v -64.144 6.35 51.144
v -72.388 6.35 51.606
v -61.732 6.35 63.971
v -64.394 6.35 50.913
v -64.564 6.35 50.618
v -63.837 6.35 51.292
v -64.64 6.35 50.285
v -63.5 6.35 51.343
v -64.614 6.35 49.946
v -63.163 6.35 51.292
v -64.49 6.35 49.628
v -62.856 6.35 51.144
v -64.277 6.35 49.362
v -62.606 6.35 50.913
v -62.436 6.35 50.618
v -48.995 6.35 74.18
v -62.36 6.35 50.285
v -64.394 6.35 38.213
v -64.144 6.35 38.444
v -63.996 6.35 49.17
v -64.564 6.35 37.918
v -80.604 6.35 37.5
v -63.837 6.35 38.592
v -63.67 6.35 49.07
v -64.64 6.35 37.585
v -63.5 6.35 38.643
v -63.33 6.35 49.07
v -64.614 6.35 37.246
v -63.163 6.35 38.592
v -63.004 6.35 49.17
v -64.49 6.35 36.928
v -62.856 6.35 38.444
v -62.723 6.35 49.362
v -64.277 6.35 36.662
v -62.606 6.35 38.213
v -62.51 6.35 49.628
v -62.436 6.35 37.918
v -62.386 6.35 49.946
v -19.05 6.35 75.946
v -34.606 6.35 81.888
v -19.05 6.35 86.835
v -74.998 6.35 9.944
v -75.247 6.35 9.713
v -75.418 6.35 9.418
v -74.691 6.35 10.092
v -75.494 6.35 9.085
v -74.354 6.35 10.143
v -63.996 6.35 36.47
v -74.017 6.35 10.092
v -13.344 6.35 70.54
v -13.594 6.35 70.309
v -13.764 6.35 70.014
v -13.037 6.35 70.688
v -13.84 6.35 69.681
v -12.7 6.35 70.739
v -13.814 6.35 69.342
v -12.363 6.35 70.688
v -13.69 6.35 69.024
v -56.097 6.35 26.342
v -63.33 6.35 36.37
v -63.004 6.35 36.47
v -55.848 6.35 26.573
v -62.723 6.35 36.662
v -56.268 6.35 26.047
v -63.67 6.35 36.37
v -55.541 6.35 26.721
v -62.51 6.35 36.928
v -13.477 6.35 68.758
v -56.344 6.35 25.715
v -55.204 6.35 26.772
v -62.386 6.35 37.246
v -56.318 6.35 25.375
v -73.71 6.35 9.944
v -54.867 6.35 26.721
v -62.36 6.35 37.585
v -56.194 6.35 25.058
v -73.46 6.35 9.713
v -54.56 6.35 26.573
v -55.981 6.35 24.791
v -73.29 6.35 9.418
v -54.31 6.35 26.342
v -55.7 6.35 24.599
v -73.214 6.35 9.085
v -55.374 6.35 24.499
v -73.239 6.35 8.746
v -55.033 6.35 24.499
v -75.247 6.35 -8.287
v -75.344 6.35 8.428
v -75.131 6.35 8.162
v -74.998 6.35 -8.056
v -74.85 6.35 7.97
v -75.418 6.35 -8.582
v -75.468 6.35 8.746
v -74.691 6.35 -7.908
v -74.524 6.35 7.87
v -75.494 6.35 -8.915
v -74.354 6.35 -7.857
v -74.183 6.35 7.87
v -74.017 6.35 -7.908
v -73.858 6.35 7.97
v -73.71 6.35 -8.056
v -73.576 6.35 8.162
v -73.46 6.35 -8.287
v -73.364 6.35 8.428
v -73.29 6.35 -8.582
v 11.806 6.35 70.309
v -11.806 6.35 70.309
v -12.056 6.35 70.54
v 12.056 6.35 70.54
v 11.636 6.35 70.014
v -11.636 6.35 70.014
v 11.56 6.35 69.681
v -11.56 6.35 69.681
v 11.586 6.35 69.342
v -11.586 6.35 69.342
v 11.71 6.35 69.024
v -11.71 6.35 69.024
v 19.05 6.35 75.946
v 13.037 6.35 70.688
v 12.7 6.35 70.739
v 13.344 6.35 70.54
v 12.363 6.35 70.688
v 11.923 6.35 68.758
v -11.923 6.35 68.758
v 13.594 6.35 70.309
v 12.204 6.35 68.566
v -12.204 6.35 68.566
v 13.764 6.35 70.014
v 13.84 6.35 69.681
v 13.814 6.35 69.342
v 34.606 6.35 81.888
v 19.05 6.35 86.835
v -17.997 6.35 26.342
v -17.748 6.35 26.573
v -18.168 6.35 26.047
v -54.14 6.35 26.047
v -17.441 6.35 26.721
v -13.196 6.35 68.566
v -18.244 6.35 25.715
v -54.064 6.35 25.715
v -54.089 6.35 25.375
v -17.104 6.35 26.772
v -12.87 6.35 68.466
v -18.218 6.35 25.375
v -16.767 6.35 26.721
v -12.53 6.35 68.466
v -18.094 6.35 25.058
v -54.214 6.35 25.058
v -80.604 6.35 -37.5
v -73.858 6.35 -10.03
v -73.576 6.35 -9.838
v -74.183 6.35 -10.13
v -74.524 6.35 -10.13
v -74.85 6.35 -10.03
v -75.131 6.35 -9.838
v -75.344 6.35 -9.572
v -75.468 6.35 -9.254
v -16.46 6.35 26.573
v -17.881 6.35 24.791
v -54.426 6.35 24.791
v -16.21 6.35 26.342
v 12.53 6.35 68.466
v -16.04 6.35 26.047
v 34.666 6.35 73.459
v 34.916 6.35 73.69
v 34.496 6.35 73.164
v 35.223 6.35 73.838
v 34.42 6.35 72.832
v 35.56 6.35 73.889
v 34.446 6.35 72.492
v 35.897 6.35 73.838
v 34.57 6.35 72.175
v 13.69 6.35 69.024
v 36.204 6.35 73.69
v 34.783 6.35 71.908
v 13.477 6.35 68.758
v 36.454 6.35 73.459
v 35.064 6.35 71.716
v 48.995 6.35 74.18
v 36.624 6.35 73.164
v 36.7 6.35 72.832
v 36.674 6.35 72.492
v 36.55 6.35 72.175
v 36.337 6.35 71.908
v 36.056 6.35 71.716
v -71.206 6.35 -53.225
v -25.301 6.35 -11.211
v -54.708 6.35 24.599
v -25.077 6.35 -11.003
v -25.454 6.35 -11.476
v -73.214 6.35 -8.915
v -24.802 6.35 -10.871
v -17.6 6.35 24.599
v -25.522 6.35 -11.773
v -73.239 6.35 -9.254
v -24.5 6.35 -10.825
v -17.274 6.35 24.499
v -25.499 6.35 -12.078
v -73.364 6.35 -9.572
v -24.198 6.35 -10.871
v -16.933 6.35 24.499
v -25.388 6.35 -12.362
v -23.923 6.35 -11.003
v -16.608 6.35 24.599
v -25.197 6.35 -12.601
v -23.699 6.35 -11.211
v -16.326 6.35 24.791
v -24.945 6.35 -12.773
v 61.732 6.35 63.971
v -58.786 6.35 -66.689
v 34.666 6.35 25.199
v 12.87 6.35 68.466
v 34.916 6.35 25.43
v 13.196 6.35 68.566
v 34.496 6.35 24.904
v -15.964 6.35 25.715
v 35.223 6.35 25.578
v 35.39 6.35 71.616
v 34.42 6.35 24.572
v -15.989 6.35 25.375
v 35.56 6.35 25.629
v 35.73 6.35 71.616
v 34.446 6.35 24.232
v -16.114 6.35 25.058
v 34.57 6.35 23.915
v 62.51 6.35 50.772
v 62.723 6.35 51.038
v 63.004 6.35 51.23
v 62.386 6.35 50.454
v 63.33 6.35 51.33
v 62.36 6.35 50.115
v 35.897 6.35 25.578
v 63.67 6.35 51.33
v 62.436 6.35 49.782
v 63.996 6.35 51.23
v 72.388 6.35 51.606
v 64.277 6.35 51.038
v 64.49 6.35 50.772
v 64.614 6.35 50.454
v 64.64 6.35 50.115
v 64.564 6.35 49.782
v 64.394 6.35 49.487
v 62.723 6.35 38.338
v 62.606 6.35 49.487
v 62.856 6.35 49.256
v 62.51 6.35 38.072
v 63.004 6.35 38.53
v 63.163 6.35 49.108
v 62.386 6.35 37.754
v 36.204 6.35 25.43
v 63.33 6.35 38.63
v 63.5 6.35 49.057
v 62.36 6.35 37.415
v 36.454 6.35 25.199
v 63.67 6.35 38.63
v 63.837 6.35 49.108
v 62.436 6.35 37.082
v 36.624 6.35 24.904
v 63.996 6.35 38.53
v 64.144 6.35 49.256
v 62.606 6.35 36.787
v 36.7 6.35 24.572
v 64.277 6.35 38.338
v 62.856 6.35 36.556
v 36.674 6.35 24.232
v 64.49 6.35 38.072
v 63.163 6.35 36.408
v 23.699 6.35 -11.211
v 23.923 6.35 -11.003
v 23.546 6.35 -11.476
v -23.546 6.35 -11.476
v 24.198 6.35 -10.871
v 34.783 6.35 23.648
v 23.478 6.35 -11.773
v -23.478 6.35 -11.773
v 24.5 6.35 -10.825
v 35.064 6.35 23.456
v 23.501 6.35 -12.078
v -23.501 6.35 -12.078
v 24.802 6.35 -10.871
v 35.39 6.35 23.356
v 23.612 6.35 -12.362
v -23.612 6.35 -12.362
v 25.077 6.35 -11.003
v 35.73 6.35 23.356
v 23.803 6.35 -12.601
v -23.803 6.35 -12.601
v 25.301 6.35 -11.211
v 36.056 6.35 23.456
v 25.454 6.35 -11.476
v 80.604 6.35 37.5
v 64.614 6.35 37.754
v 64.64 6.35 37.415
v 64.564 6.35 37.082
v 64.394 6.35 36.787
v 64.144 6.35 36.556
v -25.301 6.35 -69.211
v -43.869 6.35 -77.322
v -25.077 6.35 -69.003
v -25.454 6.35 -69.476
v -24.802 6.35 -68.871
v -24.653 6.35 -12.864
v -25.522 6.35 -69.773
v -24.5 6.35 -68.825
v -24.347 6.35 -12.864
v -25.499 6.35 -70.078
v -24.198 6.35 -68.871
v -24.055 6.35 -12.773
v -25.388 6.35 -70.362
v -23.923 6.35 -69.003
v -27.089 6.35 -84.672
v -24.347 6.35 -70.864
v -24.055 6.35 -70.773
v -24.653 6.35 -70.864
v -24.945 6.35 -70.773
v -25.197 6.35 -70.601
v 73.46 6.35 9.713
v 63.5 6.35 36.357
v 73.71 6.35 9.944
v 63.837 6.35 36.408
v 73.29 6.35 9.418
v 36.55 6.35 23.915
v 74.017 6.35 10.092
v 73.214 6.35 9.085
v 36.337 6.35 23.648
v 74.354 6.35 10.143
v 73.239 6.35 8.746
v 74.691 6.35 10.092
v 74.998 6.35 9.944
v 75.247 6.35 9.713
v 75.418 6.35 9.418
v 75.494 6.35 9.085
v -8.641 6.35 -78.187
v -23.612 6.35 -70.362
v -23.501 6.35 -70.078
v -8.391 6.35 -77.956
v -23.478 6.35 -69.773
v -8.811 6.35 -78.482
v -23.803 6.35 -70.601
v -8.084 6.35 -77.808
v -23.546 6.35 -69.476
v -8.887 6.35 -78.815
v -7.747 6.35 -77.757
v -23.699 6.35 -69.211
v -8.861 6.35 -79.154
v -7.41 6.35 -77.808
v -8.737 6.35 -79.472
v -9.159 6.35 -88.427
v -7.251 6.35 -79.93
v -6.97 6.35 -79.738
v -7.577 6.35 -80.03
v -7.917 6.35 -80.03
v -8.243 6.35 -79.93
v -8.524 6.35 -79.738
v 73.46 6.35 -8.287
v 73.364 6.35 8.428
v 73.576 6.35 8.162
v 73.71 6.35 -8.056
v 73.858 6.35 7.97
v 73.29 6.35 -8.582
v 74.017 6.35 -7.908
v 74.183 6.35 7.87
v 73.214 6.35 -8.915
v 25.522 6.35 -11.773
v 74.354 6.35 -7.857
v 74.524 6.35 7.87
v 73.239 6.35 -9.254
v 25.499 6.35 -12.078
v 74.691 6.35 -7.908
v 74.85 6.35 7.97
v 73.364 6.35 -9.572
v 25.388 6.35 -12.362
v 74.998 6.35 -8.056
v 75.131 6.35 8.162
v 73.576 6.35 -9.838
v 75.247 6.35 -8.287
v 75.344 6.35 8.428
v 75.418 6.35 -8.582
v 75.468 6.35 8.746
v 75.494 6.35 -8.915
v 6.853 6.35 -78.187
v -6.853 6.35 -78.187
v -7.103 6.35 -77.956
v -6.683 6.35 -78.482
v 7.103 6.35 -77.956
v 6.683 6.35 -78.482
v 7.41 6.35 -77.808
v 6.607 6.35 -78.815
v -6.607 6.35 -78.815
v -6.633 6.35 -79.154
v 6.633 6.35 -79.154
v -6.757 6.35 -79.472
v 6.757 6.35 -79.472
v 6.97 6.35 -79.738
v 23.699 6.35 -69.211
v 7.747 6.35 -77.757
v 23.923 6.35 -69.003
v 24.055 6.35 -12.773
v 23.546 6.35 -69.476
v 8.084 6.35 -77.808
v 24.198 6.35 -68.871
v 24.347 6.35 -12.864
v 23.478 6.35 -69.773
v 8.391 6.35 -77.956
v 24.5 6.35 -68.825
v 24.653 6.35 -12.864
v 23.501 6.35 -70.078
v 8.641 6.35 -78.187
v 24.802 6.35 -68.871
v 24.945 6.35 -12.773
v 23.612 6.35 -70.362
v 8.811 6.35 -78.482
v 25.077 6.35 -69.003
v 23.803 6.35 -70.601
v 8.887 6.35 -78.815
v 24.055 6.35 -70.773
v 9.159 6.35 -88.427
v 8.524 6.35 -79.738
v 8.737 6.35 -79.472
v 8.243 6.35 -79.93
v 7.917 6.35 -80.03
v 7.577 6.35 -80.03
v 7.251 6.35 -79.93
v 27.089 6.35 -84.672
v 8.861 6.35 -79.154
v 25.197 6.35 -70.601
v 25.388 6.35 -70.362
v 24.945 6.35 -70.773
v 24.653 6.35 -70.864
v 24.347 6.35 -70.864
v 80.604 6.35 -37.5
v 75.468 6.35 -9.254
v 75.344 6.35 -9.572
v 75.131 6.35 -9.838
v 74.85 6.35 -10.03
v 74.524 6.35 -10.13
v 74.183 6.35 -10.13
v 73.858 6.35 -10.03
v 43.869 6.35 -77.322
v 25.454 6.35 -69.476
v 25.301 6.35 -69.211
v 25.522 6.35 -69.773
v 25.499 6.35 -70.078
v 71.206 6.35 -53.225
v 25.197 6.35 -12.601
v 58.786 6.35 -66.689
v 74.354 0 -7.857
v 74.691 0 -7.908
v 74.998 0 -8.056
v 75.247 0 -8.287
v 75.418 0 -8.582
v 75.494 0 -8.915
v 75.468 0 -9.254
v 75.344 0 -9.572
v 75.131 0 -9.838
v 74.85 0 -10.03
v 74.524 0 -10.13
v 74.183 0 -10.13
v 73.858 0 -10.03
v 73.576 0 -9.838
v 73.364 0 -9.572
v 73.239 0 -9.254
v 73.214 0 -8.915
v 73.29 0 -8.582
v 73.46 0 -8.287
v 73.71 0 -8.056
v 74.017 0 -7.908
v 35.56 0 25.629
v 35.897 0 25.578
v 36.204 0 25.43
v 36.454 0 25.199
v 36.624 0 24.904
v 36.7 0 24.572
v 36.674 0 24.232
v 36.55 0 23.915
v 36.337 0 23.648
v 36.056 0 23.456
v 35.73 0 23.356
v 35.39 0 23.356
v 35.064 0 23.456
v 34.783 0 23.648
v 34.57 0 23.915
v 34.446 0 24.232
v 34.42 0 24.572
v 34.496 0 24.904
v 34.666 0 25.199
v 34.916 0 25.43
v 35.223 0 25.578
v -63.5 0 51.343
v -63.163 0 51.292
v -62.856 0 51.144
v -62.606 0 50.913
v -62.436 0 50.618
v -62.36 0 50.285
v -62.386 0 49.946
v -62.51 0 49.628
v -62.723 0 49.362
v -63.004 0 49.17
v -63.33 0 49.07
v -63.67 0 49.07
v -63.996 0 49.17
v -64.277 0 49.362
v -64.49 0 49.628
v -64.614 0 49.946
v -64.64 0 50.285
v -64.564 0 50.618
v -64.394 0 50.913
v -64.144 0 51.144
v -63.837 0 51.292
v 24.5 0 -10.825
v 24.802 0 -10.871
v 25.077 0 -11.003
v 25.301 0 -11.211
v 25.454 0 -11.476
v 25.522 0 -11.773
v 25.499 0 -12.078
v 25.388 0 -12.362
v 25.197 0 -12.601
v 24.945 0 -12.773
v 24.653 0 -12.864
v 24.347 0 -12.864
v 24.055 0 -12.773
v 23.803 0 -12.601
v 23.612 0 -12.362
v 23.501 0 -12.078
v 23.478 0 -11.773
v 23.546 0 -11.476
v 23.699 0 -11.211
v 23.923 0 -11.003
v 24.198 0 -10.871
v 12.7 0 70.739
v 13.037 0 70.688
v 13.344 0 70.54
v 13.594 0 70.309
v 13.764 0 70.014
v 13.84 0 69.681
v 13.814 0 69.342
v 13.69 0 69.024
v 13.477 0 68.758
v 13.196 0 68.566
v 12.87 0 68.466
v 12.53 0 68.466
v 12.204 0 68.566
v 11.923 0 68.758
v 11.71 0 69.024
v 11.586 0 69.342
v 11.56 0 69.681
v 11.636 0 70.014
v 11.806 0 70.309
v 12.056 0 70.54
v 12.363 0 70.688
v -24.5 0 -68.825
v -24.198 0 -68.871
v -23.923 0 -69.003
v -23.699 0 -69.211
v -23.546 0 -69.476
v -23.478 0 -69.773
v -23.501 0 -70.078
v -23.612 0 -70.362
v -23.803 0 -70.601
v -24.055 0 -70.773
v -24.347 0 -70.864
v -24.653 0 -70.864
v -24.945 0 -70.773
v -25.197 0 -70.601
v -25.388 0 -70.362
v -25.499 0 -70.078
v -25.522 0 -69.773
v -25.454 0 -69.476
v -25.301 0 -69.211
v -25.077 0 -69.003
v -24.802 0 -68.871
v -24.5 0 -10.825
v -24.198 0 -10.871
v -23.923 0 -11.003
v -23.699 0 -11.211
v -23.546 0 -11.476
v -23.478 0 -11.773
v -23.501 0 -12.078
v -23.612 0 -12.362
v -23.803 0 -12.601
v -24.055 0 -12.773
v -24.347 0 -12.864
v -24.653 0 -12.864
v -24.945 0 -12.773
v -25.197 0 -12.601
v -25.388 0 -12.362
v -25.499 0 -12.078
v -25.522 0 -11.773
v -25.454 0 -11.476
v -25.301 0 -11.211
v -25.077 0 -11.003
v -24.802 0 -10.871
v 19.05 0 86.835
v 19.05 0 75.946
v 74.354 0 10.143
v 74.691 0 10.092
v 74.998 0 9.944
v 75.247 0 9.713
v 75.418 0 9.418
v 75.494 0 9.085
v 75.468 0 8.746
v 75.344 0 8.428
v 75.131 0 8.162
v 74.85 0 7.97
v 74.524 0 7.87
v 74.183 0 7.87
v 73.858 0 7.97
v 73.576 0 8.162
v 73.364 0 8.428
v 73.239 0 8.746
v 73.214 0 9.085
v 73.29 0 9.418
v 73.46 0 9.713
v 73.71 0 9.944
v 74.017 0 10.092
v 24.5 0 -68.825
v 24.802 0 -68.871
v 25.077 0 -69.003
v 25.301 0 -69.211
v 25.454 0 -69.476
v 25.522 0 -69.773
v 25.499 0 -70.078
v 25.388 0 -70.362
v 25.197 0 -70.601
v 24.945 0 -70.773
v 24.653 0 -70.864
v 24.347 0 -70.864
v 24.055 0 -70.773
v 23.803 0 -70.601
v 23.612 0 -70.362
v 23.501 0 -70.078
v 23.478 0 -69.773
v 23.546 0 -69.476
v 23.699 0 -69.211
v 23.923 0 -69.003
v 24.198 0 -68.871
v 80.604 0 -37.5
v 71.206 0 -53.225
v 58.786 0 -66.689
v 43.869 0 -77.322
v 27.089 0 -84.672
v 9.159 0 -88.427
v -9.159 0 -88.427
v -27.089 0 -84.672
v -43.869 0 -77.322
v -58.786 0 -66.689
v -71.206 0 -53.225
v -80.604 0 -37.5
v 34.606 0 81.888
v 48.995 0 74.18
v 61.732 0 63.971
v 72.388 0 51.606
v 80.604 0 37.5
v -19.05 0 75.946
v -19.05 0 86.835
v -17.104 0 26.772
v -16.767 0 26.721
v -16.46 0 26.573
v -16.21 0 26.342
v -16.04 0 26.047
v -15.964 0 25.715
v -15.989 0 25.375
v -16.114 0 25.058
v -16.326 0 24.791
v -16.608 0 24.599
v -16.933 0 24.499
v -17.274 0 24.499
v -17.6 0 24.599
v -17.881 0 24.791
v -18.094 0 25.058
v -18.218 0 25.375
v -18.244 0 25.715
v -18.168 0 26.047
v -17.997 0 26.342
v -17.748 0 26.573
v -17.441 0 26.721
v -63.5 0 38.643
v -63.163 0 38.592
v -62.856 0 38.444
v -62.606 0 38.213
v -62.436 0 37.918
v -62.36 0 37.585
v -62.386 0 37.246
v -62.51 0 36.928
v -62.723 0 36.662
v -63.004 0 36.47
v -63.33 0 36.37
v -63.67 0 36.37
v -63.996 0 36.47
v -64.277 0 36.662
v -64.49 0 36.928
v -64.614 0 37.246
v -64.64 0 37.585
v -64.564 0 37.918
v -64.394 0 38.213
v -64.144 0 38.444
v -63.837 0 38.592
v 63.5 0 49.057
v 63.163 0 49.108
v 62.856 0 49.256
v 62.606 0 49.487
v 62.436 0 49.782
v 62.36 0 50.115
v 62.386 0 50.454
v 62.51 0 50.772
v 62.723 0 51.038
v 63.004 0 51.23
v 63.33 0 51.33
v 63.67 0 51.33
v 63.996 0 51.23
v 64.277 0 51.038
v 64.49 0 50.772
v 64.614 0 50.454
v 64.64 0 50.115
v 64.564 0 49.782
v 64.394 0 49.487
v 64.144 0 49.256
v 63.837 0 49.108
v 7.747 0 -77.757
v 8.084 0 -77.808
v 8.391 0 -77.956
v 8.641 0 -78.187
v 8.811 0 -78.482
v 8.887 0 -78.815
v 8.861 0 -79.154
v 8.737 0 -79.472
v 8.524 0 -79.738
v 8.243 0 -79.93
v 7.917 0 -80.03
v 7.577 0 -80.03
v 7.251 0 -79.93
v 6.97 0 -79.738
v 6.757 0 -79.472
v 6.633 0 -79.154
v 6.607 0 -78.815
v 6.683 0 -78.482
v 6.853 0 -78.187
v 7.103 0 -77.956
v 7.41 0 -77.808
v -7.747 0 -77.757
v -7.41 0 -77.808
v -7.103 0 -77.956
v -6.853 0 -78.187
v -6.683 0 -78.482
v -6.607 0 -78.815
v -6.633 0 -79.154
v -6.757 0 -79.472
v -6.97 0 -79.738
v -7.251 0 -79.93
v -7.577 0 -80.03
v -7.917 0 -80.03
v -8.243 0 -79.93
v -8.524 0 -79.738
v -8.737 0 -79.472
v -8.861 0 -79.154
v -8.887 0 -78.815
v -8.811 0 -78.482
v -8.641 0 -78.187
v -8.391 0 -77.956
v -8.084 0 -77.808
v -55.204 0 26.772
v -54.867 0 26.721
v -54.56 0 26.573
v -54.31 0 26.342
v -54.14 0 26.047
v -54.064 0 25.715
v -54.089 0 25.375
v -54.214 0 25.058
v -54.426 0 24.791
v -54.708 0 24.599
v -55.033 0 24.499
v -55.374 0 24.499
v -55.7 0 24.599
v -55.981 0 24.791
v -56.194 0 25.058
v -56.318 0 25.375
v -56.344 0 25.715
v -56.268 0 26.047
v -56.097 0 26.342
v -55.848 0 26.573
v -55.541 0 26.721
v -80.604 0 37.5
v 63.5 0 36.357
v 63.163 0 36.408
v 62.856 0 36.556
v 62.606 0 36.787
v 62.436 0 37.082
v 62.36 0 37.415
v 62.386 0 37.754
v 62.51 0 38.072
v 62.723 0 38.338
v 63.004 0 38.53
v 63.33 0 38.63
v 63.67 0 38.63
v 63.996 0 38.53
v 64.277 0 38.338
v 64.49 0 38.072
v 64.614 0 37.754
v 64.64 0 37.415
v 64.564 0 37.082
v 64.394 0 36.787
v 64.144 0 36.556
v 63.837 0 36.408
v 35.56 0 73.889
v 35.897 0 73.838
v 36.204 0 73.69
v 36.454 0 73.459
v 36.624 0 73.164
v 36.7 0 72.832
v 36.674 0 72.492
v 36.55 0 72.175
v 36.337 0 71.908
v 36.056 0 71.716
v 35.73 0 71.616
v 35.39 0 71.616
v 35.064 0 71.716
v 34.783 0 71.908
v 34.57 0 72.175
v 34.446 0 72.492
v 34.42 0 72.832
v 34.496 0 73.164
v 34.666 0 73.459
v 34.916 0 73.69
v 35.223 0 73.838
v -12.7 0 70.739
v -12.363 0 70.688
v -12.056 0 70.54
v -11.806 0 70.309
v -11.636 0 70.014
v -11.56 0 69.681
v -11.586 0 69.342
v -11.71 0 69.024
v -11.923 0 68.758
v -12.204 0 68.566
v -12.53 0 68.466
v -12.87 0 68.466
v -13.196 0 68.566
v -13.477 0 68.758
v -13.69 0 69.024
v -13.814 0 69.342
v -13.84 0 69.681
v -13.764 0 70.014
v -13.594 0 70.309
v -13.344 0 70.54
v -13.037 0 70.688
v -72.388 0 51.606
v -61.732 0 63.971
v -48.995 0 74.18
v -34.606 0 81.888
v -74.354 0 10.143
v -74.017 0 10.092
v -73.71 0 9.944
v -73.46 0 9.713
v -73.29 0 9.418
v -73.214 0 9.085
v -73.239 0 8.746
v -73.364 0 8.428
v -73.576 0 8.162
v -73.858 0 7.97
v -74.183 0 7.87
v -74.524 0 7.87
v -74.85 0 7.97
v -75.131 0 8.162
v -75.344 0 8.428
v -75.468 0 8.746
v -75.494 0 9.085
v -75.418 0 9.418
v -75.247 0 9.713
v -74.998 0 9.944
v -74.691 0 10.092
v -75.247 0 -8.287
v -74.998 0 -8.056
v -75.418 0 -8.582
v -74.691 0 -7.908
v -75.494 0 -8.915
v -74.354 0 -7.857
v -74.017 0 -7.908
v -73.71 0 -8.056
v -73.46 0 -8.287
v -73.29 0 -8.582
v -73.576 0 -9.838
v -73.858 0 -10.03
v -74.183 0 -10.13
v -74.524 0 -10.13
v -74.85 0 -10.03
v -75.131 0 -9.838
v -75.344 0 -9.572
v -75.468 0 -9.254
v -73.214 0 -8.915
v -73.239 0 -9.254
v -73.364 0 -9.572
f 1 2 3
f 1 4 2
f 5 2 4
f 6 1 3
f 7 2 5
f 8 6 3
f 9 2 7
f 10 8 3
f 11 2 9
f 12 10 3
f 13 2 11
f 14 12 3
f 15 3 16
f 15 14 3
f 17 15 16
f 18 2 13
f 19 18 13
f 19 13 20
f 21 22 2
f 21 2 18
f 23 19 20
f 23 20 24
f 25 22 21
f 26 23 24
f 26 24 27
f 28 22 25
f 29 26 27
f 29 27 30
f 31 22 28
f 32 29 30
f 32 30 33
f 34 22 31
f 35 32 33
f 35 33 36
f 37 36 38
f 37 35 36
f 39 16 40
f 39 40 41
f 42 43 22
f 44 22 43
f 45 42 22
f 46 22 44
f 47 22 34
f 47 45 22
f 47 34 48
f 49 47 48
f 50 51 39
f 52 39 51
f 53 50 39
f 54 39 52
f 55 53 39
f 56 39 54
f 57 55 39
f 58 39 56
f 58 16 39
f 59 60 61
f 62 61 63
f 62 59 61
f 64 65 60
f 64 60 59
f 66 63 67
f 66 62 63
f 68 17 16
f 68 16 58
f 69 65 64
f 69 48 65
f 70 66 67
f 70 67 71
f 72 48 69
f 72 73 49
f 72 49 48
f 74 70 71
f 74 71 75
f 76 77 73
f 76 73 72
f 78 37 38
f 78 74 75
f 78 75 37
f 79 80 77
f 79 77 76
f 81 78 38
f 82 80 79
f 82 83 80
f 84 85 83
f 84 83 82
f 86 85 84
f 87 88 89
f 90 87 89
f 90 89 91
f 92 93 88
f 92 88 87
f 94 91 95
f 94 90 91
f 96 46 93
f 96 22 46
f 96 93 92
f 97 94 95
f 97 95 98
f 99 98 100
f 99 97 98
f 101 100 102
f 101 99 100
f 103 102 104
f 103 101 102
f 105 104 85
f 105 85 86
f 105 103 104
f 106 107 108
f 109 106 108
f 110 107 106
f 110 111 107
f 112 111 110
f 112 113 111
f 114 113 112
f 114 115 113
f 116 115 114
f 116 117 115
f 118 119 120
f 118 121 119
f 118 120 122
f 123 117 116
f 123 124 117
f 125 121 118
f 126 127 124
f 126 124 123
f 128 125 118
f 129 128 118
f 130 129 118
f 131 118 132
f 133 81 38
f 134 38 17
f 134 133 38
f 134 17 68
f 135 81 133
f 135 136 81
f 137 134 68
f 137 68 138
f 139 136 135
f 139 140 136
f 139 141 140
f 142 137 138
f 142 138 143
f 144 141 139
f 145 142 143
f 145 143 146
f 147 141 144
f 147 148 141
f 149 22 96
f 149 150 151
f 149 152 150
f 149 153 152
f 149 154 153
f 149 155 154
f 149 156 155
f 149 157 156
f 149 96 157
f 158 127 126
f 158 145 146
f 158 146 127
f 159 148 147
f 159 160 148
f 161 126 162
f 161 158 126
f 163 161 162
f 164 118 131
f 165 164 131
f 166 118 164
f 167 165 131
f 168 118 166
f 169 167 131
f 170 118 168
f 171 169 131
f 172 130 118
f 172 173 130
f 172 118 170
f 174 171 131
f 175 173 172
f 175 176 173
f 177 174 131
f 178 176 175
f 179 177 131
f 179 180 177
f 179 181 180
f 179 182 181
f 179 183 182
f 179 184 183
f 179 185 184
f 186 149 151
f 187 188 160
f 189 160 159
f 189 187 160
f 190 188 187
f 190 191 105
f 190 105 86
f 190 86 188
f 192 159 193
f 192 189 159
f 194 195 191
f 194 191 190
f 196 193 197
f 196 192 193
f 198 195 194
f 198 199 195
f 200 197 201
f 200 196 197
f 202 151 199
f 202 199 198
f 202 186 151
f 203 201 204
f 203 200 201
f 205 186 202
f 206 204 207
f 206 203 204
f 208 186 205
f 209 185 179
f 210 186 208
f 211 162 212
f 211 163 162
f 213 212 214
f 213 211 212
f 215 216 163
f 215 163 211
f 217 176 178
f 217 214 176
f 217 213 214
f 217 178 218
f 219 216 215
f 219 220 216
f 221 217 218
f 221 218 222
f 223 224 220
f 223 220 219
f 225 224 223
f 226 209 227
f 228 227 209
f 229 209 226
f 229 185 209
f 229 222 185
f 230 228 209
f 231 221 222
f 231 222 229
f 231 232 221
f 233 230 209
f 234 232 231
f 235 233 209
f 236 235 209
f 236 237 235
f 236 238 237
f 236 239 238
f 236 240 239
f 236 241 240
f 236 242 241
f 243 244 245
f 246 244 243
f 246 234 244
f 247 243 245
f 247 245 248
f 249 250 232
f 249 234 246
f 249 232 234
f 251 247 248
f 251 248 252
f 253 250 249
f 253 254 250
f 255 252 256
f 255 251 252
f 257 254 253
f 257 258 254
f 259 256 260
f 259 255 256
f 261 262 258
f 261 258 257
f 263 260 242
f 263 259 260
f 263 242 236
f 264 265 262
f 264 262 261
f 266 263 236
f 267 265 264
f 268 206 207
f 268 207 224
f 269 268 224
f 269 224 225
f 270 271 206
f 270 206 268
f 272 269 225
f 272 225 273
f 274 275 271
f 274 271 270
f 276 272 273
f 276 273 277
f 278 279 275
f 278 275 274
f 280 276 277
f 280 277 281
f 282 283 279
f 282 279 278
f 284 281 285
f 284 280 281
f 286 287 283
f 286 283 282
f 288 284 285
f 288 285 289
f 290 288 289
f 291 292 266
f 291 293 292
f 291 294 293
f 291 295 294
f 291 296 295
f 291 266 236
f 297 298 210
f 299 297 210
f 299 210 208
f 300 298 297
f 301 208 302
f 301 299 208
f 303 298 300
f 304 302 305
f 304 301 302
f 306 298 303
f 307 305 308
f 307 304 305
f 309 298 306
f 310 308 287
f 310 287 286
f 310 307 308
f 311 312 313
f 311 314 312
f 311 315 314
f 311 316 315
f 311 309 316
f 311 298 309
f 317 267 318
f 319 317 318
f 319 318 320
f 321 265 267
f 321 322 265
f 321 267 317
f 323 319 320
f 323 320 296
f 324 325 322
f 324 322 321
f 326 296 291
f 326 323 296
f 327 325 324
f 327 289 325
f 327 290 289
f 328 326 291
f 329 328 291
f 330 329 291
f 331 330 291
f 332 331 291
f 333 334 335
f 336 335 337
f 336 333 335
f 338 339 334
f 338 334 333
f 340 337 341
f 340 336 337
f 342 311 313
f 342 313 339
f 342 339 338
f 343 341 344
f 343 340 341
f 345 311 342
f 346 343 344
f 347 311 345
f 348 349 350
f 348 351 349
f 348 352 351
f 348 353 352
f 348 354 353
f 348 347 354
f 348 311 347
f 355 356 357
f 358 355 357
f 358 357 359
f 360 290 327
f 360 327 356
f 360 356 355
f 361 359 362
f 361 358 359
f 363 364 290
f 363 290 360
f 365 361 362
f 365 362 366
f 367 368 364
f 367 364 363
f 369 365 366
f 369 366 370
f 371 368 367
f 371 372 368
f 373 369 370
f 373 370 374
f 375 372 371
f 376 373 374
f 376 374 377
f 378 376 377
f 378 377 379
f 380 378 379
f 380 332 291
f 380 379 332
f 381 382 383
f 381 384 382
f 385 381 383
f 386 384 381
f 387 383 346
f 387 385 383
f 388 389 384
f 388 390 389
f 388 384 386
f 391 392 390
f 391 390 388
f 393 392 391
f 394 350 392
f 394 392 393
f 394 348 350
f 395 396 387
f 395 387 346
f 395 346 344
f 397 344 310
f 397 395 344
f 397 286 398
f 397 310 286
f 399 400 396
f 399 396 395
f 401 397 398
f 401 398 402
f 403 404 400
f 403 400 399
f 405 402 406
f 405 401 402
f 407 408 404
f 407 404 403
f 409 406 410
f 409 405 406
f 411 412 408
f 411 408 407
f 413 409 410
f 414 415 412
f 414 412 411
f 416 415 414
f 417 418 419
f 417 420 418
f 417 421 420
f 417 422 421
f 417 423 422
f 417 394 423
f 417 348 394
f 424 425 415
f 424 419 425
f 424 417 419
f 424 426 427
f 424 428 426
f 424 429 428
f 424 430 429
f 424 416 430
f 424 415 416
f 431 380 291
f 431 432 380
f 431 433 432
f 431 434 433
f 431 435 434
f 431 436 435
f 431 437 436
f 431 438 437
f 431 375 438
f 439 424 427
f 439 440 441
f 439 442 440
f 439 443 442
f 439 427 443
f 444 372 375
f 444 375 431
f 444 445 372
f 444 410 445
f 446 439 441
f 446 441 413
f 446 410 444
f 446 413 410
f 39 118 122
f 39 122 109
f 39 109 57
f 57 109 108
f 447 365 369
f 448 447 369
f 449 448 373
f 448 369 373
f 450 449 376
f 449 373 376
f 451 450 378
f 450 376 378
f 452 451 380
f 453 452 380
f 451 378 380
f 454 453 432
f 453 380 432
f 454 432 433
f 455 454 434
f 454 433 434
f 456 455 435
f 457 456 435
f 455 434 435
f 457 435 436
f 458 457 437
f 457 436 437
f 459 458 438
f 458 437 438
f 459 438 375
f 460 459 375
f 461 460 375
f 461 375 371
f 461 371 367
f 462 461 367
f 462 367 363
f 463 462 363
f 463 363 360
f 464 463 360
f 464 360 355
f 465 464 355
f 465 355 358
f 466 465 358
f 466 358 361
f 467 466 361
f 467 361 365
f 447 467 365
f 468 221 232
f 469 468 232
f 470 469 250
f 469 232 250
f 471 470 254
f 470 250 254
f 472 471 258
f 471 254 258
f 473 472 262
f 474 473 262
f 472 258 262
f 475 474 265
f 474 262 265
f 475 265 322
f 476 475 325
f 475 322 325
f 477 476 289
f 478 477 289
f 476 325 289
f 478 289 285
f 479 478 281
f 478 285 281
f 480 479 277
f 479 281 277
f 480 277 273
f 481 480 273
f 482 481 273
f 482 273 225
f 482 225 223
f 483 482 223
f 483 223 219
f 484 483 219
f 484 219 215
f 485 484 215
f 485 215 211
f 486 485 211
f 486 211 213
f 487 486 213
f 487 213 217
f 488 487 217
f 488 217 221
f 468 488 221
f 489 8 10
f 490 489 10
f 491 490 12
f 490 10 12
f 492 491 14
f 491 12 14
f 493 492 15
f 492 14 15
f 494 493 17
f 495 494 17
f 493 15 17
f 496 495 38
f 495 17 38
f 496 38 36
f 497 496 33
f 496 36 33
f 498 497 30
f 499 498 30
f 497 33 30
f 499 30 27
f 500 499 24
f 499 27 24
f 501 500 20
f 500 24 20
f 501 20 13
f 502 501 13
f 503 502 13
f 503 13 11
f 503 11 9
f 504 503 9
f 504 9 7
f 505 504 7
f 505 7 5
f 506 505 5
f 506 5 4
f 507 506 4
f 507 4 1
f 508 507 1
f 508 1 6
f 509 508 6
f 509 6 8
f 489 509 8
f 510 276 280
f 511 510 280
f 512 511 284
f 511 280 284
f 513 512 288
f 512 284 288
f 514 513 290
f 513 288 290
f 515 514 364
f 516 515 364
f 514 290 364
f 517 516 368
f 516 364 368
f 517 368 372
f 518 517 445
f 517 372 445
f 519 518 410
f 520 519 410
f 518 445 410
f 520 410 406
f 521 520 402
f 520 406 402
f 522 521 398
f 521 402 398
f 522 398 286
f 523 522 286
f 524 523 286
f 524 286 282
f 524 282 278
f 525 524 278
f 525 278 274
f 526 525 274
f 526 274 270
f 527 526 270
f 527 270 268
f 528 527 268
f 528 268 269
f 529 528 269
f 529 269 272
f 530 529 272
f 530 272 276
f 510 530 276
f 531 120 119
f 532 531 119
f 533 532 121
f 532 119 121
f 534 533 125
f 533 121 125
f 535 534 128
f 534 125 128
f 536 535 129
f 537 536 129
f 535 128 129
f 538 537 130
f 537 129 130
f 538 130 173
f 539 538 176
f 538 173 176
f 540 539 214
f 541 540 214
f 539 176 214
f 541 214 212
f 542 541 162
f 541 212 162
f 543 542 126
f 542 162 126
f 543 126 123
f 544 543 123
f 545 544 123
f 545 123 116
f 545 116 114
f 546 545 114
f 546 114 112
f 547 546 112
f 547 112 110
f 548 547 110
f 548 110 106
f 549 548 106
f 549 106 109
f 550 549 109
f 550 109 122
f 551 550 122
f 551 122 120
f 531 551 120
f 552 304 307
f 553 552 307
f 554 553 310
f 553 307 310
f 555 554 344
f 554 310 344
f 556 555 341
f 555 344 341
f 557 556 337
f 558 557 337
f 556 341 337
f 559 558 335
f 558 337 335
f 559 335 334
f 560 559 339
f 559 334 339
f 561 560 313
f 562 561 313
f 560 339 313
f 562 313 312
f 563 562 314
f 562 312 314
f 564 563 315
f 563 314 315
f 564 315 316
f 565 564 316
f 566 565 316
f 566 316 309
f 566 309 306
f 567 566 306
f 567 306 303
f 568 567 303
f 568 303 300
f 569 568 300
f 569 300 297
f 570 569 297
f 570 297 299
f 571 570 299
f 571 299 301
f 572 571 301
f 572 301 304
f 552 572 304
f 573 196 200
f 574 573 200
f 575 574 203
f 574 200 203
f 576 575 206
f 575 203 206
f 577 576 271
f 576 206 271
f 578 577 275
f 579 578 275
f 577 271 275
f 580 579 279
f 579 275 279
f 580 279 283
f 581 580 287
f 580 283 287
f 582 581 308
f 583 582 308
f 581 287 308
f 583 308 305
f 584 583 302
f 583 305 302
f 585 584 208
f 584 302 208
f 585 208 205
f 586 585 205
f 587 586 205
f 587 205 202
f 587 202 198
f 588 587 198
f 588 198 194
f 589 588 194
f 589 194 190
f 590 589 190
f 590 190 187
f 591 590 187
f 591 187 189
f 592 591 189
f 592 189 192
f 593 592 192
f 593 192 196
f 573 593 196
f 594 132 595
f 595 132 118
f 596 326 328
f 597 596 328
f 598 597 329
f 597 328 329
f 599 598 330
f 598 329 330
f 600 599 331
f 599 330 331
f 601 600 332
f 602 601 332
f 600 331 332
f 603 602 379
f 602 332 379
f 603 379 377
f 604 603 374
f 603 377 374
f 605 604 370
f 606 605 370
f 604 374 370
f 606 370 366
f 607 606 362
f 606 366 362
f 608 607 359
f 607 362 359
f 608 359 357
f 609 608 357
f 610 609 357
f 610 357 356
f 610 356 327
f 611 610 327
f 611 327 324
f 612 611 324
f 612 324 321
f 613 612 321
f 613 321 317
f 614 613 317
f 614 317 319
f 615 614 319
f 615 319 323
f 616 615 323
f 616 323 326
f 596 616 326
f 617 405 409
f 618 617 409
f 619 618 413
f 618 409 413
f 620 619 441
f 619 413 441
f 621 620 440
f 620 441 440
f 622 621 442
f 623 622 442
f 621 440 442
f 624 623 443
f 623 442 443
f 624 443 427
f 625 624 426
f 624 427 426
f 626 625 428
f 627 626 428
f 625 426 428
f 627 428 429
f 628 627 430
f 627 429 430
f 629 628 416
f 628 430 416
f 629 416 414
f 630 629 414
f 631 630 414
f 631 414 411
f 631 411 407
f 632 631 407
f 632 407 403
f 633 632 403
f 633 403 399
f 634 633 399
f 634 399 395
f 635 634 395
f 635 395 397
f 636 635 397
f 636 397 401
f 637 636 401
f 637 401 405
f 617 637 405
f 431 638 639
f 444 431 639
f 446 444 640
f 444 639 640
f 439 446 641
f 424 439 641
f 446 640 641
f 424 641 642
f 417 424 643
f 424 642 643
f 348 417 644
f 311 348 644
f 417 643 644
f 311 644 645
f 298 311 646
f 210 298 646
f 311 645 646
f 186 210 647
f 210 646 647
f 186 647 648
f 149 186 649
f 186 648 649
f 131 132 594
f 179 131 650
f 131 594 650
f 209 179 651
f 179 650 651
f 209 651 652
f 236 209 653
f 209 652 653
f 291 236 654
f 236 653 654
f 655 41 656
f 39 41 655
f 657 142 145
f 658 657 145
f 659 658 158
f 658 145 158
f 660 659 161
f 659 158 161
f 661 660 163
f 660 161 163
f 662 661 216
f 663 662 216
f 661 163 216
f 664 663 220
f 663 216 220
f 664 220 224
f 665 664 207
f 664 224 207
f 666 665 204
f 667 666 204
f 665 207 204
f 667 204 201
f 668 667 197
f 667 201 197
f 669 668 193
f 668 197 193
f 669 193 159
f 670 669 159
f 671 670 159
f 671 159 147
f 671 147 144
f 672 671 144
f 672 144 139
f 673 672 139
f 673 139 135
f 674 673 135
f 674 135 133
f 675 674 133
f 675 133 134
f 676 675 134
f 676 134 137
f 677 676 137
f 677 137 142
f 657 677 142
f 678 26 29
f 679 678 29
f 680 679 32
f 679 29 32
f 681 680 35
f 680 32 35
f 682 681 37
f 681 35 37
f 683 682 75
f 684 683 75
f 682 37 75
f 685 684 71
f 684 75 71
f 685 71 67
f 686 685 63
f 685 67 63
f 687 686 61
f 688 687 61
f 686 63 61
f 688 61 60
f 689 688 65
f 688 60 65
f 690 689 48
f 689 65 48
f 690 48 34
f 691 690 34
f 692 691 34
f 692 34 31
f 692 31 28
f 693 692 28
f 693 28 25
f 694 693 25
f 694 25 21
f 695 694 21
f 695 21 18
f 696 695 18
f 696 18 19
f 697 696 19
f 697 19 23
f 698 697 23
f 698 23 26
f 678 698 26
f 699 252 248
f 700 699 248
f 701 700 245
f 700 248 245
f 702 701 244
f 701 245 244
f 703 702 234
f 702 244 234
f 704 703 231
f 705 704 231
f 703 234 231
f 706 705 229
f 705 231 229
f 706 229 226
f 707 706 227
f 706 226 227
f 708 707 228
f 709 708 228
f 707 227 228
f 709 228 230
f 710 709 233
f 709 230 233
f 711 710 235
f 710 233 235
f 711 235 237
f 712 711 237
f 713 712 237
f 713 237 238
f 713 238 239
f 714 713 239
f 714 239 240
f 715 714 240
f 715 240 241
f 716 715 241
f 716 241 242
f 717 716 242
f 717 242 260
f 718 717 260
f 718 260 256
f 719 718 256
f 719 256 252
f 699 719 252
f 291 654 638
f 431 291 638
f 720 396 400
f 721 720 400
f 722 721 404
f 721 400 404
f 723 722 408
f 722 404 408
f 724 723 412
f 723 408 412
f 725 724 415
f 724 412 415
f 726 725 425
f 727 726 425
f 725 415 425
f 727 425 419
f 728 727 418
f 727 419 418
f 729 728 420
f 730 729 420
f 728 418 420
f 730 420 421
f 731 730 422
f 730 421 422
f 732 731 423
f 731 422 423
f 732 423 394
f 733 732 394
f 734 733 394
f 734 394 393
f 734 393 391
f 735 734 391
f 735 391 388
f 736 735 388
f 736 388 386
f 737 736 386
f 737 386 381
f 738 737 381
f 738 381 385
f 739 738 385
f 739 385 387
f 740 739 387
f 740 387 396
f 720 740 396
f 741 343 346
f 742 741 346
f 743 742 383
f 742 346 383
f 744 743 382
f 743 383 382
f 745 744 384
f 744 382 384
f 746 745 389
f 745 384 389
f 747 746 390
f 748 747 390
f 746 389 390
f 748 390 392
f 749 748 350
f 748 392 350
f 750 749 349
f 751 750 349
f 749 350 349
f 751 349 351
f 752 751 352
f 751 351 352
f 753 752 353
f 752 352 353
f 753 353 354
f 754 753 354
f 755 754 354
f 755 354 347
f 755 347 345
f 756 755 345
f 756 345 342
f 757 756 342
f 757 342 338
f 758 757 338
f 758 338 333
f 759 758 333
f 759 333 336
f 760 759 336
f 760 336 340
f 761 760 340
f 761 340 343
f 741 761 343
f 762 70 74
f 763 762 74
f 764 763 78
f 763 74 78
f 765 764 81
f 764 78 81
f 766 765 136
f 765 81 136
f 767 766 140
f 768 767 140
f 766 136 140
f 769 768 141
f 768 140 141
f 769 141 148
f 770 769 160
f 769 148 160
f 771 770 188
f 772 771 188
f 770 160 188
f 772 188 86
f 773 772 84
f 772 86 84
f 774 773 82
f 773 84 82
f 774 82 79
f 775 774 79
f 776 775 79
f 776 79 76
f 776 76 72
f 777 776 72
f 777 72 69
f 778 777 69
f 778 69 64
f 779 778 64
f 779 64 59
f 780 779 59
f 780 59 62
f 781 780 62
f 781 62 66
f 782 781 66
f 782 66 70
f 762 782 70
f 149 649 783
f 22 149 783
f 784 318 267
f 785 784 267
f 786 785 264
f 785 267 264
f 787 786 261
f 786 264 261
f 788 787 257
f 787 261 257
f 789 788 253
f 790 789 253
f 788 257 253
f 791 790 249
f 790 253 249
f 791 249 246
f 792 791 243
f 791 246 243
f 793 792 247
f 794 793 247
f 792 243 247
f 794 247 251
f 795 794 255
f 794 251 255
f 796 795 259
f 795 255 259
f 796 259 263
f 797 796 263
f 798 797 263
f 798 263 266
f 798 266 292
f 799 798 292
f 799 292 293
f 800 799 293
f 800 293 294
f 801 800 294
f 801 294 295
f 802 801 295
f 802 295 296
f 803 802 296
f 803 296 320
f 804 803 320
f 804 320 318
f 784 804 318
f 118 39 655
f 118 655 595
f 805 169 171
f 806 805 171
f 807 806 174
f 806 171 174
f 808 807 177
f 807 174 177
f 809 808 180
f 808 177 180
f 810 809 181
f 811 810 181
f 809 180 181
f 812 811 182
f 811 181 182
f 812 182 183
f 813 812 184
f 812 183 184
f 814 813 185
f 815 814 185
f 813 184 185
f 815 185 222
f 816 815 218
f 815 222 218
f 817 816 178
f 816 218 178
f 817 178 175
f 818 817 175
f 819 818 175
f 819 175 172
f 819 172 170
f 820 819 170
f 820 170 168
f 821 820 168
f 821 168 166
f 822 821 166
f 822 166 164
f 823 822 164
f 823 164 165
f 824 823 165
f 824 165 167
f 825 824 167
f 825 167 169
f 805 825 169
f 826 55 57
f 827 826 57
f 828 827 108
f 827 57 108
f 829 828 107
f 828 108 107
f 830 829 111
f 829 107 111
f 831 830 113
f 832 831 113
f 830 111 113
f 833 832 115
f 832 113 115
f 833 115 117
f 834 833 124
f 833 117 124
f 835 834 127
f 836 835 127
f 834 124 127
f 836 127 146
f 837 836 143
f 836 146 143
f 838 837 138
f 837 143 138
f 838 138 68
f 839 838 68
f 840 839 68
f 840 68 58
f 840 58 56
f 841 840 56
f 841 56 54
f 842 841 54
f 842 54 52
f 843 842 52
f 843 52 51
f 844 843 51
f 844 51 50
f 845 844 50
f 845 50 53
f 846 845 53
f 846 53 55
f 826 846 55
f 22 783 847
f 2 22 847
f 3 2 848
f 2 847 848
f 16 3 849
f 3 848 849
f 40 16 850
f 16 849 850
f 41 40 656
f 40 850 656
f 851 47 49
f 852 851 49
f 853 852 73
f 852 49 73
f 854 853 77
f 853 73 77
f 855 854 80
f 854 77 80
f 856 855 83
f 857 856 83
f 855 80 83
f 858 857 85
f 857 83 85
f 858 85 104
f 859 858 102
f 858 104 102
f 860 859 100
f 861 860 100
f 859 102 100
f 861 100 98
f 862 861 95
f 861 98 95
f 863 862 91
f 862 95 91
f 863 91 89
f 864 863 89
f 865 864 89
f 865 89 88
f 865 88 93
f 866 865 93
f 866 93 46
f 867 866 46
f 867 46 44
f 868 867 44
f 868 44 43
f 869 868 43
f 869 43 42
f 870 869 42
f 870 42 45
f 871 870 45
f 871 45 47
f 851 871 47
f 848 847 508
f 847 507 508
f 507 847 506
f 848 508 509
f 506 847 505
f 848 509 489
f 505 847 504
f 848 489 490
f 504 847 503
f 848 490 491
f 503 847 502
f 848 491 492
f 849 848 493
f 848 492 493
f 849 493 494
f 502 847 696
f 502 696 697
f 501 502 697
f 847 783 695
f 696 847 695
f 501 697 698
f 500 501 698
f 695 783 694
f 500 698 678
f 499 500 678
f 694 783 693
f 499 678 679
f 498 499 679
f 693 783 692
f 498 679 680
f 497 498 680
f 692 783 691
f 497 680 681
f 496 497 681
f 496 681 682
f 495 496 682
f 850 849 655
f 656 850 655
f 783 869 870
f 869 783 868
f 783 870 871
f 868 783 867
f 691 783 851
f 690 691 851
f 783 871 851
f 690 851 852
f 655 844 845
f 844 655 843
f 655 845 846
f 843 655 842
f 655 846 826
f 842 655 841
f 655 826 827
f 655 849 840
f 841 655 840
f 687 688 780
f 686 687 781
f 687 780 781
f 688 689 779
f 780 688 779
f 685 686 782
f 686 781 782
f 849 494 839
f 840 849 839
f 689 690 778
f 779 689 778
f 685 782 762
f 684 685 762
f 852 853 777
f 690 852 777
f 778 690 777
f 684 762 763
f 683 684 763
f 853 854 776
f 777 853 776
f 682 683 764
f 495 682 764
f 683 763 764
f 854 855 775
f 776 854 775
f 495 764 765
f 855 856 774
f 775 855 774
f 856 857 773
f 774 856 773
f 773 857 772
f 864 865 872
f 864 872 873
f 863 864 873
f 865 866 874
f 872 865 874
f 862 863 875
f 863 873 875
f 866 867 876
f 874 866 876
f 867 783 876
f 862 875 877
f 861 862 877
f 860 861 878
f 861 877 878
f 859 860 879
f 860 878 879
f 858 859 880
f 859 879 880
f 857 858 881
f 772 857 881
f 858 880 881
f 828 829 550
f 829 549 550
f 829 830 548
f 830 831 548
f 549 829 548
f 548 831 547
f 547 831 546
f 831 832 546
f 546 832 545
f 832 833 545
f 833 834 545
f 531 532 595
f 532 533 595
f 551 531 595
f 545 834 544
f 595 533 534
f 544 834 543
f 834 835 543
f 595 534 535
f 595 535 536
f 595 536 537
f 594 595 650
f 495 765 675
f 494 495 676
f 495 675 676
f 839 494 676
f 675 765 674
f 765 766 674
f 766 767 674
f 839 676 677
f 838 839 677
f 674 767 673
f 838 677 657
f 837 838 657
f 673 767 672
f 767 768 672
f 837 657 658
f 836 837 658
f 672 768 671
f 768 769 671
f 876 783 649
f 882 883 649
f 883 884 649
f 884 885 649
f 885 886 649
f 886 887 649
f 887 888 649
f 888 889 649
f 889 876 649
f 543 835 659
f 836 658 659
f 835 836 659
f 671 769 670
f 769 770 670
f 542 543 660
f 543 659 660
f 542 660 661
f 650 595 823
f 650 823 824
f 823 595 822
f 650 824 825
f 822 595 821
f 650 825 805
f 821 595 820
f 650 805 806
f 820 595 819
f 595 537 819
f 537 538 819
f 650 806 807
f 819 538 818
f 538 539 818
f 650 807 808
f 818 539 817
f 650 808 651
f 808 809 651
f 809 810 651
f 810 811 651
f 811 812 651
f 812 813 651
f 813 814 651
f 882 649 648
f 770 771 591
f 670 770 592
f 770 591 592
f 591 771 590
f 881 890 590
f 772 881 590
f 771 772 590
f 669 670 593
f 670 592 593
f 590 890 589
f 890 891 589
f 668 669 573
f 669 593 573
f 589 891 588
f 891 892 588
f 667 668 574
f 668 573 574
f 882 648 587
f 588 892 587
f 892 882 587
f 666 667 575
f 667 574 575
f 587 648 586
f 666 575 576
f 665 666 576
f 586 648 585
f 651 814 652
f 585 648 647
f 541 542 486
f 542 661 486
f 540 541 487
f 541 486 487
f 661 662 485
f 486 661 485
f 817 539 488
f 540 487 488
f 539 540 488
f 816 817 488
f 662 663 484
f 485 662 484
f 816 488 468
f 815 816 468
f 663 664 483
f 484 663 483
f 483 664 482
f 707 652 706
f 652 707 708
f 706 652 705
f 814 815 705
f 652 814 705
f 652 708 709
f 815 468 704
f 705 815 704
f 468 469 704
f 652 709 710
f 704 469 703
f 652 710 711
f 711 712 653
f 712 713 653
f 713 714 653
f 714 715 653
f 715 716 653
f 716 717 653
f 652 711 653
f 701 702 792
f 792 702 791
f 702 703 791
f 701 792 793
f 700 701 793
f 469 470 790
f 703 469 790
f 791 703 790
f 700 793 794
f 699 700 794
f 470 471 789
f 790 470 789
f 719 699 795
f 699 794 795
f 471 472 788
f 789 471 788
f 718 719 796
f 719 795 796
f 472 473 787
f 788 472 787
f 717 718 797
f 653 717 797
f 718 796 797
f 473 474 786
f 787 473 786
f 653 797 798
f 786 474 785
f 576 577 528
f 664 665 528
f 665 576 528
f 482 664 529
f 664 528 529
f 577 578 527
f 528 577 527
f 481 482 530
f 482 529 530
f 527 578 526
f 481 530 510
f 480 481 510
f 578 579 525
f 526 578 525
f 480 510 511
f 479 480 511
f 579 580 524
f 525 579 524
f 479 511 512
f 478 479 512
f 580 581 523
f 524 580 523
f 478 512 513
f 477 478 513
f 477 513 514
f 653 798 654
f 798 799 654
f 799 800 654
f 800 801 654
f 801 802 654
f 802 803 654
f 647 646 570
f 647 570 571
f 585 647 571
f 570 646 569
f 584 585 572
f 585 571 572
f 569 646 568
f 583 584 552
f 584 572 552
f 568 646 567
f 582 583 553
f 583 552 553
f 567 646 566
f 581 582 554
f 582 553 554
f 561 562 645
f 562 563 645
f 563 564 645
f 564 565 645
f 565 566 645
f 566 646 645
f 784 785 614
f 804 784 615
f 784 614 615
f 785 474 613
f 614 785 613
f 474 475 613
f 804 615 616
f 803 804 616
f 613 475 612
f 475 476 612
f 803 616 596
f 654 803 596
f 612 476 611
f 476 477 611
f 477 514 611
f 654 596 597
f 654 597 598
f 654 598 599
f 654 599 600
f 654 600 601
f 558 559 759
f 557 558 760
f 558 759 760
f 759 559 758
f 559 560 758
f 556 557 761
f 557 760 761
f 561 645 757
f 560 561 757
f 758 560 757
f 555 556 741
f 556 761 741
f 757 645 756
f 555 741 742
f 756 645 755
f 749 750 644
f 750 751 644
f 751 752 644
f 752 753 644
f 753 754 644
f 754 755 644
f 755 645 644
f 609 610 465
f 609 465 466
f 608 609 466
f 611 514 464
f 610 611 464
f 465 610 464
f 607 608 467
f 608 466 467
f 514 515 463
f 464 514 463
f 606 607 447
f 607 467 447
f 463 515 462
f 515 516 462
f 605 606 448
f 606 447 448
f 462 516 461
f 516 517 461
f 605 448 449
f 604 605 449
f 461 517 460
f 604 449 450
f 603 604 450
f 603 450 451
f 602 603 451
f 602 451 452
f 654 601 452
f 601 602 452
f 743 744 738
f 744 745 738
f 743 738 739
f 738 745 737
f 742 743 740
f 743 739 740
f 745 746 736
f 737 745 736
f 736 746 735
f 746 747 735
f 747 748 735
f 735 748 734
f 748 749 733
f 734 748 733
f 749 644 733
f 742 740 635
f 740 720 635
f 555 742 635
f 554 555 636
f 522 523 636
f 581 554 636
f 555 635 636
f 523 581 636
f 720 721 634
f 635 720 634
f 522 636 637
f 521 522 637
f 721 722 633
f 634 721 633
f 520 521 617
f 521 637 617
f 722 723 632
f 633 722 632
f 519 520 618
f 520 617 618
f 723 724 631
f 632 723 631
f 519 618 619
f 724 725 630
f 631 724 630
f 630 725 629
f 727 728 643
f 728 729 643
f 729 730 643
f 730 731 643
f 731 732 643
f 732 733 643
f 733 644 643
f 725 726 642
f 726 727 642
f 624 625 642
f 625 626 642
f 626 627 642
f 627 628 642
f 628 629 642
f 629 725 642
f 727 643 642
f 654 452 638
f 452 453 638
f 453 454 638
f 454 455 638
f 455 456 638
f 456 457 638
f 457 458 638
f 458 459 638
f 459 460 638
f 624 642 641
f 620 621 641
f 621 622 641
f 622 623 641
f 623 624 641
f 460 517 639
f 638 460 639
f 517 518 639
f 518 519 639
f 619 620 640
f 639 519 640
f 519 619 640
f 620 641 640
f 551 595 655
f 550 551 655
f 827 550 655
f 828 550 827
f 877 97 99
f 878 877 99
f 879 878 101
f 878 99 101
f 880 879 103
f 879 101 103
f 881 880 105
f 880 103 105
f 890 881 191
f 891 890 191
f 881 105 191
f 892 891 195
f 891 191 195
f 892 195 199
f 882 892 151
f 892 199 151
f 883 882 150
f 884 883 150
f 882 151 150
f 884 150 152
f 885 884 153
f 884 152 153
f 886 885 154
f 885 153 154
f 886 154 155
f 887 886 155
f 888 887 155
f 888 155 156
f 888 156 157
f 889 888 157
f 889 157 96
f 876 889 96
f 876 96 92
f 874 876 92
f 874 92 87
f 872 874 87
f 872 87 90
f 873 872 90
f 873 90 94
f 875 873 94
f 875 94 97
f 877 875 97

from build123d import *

# Parameters (mm, degrees)
MAIN_BODY_DEPTH     = 6.35
RASPBERRY_PI_REACH  = 122.169
SKETCH2_R           = 1.025
MOTOR_MOUNTS_REACH  = 122.169
SKETCH3_R           = 1.143
CUT_EXTRUDE3_REACH  = 122.169
SKETCH4_R           = 1.143
SKETCH5_R           = 1.143
GRABBER_MOUNT_DEPTH = 121.168600308
SKETCH6_R           = 1.143
FRONT_IR_DEPTH      = 121.168600308
SKETCH8_R           = 1.143
SIDE_IR_DEPTH       = 121.168600308
SKETCH9_R           = 1.143
CUT_EXTRUDE4_DEPTH  = 121.168600308
SKETCH10_W          = 38.1
SKETCH10_H          = 25.908
CUT_EXTRUDE5_DEPTH  = 121.168600308


with BuildPart() as part:
    # Sketch1 → Main Body (new body)
    with BuildSketch(Plane(origin=(0, 0, 0), x_dir=(1, 0, 0), z_dir=(0, 1, 0))):
        with BuildLine():
            Line((-80.603721998, 37.5), (-80.603721998, -37.5))
            ThreePointArc((-80.603721998, -37.5), (0, -88.9), (80.603721998, -37.5))
            Line((80.603721998, -37.5), (80.603721998, 37.5))
            ThreePointArc((80.603721998, 37.5), (0, 88.9), (-80.603721998, 37.5))
        make_face()
    extrude(amount=MAIN_BODY_DEPTH)

    # Sketch2 → Raspberry Pi (cut, up to next)
    with BuildSketch(Plane(origin=(0, 6.35, 0), x_dir=(1, 0, 0), z_dir=(0, 1, 0)), mode=Mode.PRIVATE) as raspberry_pi_sk1:
        with Locations(Location((24.5, 69.85, 0), (0, 0, 270))):
            Circle(SKETCH2_R)
    raspberry_pi_tool1 = extrude(raspberry_pi_sk1.sketch, amount=-RASPBERRY_PI_REACH, mode=Mode.PRIVATE) & part.part
    # Sketch2 → Raspberry Pi (cut, up to next)
    with BuildSketch(Plane(origin=(0, 6.35, 0), x_dir=(1, 0, 0), z_dir=(0, 1, 0)), mode=Mode.PRIVATE) as raspberry_pi_sk2:
        with Locations(Location((24.5, 11.85, 0), (0, 0, 270))):
            Circle(SKETCH2_R)
    raspberry_pi_tool2 = extrude(raspberry_pi_sk2.sketch, amount=-RASPBERRY_PI_REACH, mode=Mode.PRIVATE) & part.part
    # Sketch2 → Raspberry Pi (cut, up to next)
    with BuildSketch(Plane(origin=(0, 6.35, 0), x_dir=(1, 0, 0), z_dir=(0, 1, 0)), mode=Mode.PRIVATE) as raspberry_pi_sk3:
        with Locations(Location((-24.5, 11.85, 0), (0, 0, 270))):
            Circle(SKETCH2_R)
    raspberry_pi_tool3 = extrude(raspberry_pi_sk3.sketch, amount=-RASPBERRY_PI_REACH, mode=Mode.PRIVATE) & part.part
    # Sketch2 → Raspberry Pi (cut, up to next)
    with BuildSketch(Plane(origin=(0, 6.35, 0), x_dir=(1, 0, 0), z_dir=(0, 1, 0)), mode=Mode.PRIVATE) as raspberry_pi_sk4:
        with Locations(Location((-24.5, 69.85, 0), (0, 0, 270))):
            Circle(SKETCH2_R)
    raspberry_pi_tool4 = extrude(raspberry_pi_sk4.sketch, amount=-RASPBERRY_PI_REACH, mode=Mode.PRIVATE) & part.part
    add(raspberry_pi_tool1.solids().sort_by_distance((24.5, 6.35, -69.85))[0], mode=Mode.SUBTRACT)
    add(raspberry_pi_tool2.solids().sort_by_distance((24.5, 6.35, -11.85))[0], mode=Mode.SUBTRACT)
    add(raspberry_pi_tool3.solids().sort_by_distance((-24.5, 6.35, -11.85))[0], mode=Mode.SUBTRACT)
    add(raspberry_pi_tool4.solids().sort_by_distance((-24.5, 6.35, -69.85))[0], mode=Mode.SUBTRACT)

    # Sketch3 → Motor Mounts (cut, up to next)
    with BuildSketch(Plane(origin=(0, 6.35, 0), x_dir=(1, 0, 0), z_dir=(0, 1, 0)), mode=Mode.PRIVATE) as motor_mounts_sk1:
        with Locations(Location((-74.353721998, 9, 0), (0, 0, 270))):
            Circle(SKETCH3_R)
    motor_mounts_tool1 = extrude(motor_mounts_sk1.sketch, amount=-MOTOR_MOUNTS_REACH, mode=Mode.PRIVATE) & part.part
    # Sketch3 → Motor Mounts (cut, up to next)
    with BuildSketch(Plane(origin=(0, 6.35, 0), x_dir=(1, 0, 0), z_dir=(0, 1, 0)), mode=Mode.PRIVATE) as motor_mounts_sk2:
        with Locations(Location((-74.353721998, -9, 0), (0, 0, 270))):
            Circle(SKETCH3_R)
    motor_mounts_tool2 = extrude(motor_mounts_sk2.sketch, amount=-MOTOR_MOUNTS_REACH, mode=Mode.PRIVATE) & part.part
    # Sketch3 → Motor Mounts (cut, up to next)
    with BuildSketch(Plane(origin=(0, 6.35, 0), x_dir=(1, 0, 0), z_dir=(0, 1, 0)), mode=Mode.PRIVATE) as motor_mounts_sk3:
        with Locations(Location((74.353721998, 9, 0), (0, 0, 270))):
            Circle(SKETCH3_R)
    motor_mounts_tool3 = extrude(motor_mounts_sk3.sketch, amount=-MOTOR_MOUNTS_REACH, mode=Mode.PRIVATE) & part.part
    # Sketch3 → Motor Mounts (cut, up to next)
    with BuildSketch(Plane(origin=(0, 6.35, 0), x_dir=(1, 0, 0), z_dir=(0, 1, 0)), mode=Mode.PRIVATE) as motor_mounts_sk4:
        with Locations(Location((74.353721998, -9, 0), (0, 0, 270))):
            Circle(SKETCH3_R)
    motor_mounts_tool4 = extrude(motor_mounts_sk4.sketch, amount=-MOTOR_MOUNTS_REACH, mode=Mode.PRIVATE) & part.part
    add(motor_mounts_tool1.solids().sort_by_distance((-74.353722, 6.35, -9))[0], mode=Mode.SUBTRACT)
    add(motor_mounts_tool2.solids().sort_by_distance((-74.353722, 6.35, 9))[0], mode=Mode.SUBTRACT)
    add(motor_mounts_tool3.solids().sort_by_distance((74.353722, 6.35, -9))[0], mode=Mode.SUBTRACT)
    add(motor_mounts_tool4.solids().sort_by_distance((74.353722, 6.35, 9))[0], mode=Mode.SUBTRACT)

    # Sketch4 → Cut-Extrude3 (cut, up to next)
    with BuildSketch(Plane(origin=(0, 6.35, 0), x_dir=(1, 0, 0), z_dir=(0, 1, 0)), mode=Mode.PRIVATE) as cut_extrude3_sk1:
        with Locations(Location((-7.747, 78.9, 0), (0, 0, 270))):
            Circle(SKETCH4_R)
    cut_extrude3_tool1 = extrude(cut_extrude3_sk1.sketch, amount=-CUT_EXTRUDE3_REACH, mode=Mode.PRIVATE) & part.part
    # Sketch4 → Cut-Extrude3 (cut, up to next)
    with BuildSketch(Plane(origin=(0, 6.35, 0), x_dir=(1, 0, 0), z_dir=(0, 1, 0)), mode=Mode.PRIVATE) as cut_extrude3_sk2:
        with Locations(Location((7.747, 78.9, 0), (0, 0, 270))):
            Circle(SKETCH4_R)
    cut_extrude3_tool2 = extrude(cut_extrude3_sk2.sketch, amount=-CUT_EXTRUDE3_REACH, mode=Mode.PRIVATE) & part.part
    add(cut_extrude3_tool1.solids().sort_by_distance((-7.747, 6.35, -78.9))[0], mode=Mode.SUBTRACT)
    add(cut_extrude3_tool2.solids().sort_by_distance((7.747, 6.35, -78.9))[0], mode=Mode.SUBTRACT)

    # Sketch5 → Grabber Mount (cut, through all)
    with BuildSketch(Plane(origin=(0, 6.35, 0), x_dir=(1, 0, 0), z_dir=(0, 1, 0))):
        with Locations(Location((35.56, -24.48608666, 0), (0, 0, 270))):
            Circle(SKETCH5_R)
        with Locations(Location((35.56, -72.74608666, 0), (0, 0, 270))):
            Circle(SKETCH5_R)
    extrude(amount=-GRABBER_MOUNT_DEPTH, mode=Mode.SUBTRACT)

    # Sketch6 → Front IR (cut, through all)
    with BuildSketch(Plane(origin=(0, 6.35, 0), x_dir=(1, 0, 0), z_dir=(0, 1, 0))):
        with Locations(Location((-12.7, -69.596, 0), (0, 0, 270))):
            Circle(SKETCH6_R)
        with Locations(Location((12.7, -69.596, 0), (0, 0, 270))):
            Circle(SKETCH6_R)
    extrude(amount=-FRONT_IR_DEPTH, mode=Mode.SUBTRACT)

    # Sketch8 → Side IR (cut, through all)
    with BuildSketch(Plane(origin=(0, 6.35, 0), x_dir=(1, 0, 0), z_dir=(0, 1, 0))):
        with Locations(Location((-63.5, -37.5, 0), (0, 0, 270))):
            Circle(SKETCH8_R)
        with Locations(Location((-63.5, -50.2, 0), (0, 0, 270))):
            Circle(SKETCH8_R)
        with Locations(Location((63.5, -50.2, 0), (0, 0, 90))):
            Circle(SKETCH8_R)
        with Locations(Location((63.5, -37.5, 0), (0, 0, 90))):
            Circle(SKETCH8_R)
    extrude(amount=-SIDE_IR_DEPTH, mode=Mode.SUBTRACT)

    # Sketch9 → Cut-Extrude4 (cut, through all)
    with BuildSketch(Plane(origin=(0, 6.35, 0), x_dir=(1, 0, 0), z_dir=(0, 1, 0))):
        with Locations(Location((-55.203721998, -25.62908666, 0), (0, 0, 270))):
            Circle(SKETCH9_R)
        with Locations(Location((-17.103721998, -25.62908666, 0), (0, 0, 270))):
            Circle(SKETCH9_R)
    extrude(amount=-CUT_EXTRUDE4_DEPTH, mode=Mode.SUBTRACT)

    # Sketch10 → Cut-Extrude5 (cut, through all)
    with BuildSketch(Plane(origin=(0, 6.35, 0), x_dir=(1, 0, 0), z_dir=(0, 1, 0))):
        with Locations((0, -88.9)):
            Rectangle(SKETCH10_W, SKETCH10_H)
    extrude(amount=-CUT_EXTRUDE5_DEPTH, mode=Mode.SUBTRACT)


solid = part.part
